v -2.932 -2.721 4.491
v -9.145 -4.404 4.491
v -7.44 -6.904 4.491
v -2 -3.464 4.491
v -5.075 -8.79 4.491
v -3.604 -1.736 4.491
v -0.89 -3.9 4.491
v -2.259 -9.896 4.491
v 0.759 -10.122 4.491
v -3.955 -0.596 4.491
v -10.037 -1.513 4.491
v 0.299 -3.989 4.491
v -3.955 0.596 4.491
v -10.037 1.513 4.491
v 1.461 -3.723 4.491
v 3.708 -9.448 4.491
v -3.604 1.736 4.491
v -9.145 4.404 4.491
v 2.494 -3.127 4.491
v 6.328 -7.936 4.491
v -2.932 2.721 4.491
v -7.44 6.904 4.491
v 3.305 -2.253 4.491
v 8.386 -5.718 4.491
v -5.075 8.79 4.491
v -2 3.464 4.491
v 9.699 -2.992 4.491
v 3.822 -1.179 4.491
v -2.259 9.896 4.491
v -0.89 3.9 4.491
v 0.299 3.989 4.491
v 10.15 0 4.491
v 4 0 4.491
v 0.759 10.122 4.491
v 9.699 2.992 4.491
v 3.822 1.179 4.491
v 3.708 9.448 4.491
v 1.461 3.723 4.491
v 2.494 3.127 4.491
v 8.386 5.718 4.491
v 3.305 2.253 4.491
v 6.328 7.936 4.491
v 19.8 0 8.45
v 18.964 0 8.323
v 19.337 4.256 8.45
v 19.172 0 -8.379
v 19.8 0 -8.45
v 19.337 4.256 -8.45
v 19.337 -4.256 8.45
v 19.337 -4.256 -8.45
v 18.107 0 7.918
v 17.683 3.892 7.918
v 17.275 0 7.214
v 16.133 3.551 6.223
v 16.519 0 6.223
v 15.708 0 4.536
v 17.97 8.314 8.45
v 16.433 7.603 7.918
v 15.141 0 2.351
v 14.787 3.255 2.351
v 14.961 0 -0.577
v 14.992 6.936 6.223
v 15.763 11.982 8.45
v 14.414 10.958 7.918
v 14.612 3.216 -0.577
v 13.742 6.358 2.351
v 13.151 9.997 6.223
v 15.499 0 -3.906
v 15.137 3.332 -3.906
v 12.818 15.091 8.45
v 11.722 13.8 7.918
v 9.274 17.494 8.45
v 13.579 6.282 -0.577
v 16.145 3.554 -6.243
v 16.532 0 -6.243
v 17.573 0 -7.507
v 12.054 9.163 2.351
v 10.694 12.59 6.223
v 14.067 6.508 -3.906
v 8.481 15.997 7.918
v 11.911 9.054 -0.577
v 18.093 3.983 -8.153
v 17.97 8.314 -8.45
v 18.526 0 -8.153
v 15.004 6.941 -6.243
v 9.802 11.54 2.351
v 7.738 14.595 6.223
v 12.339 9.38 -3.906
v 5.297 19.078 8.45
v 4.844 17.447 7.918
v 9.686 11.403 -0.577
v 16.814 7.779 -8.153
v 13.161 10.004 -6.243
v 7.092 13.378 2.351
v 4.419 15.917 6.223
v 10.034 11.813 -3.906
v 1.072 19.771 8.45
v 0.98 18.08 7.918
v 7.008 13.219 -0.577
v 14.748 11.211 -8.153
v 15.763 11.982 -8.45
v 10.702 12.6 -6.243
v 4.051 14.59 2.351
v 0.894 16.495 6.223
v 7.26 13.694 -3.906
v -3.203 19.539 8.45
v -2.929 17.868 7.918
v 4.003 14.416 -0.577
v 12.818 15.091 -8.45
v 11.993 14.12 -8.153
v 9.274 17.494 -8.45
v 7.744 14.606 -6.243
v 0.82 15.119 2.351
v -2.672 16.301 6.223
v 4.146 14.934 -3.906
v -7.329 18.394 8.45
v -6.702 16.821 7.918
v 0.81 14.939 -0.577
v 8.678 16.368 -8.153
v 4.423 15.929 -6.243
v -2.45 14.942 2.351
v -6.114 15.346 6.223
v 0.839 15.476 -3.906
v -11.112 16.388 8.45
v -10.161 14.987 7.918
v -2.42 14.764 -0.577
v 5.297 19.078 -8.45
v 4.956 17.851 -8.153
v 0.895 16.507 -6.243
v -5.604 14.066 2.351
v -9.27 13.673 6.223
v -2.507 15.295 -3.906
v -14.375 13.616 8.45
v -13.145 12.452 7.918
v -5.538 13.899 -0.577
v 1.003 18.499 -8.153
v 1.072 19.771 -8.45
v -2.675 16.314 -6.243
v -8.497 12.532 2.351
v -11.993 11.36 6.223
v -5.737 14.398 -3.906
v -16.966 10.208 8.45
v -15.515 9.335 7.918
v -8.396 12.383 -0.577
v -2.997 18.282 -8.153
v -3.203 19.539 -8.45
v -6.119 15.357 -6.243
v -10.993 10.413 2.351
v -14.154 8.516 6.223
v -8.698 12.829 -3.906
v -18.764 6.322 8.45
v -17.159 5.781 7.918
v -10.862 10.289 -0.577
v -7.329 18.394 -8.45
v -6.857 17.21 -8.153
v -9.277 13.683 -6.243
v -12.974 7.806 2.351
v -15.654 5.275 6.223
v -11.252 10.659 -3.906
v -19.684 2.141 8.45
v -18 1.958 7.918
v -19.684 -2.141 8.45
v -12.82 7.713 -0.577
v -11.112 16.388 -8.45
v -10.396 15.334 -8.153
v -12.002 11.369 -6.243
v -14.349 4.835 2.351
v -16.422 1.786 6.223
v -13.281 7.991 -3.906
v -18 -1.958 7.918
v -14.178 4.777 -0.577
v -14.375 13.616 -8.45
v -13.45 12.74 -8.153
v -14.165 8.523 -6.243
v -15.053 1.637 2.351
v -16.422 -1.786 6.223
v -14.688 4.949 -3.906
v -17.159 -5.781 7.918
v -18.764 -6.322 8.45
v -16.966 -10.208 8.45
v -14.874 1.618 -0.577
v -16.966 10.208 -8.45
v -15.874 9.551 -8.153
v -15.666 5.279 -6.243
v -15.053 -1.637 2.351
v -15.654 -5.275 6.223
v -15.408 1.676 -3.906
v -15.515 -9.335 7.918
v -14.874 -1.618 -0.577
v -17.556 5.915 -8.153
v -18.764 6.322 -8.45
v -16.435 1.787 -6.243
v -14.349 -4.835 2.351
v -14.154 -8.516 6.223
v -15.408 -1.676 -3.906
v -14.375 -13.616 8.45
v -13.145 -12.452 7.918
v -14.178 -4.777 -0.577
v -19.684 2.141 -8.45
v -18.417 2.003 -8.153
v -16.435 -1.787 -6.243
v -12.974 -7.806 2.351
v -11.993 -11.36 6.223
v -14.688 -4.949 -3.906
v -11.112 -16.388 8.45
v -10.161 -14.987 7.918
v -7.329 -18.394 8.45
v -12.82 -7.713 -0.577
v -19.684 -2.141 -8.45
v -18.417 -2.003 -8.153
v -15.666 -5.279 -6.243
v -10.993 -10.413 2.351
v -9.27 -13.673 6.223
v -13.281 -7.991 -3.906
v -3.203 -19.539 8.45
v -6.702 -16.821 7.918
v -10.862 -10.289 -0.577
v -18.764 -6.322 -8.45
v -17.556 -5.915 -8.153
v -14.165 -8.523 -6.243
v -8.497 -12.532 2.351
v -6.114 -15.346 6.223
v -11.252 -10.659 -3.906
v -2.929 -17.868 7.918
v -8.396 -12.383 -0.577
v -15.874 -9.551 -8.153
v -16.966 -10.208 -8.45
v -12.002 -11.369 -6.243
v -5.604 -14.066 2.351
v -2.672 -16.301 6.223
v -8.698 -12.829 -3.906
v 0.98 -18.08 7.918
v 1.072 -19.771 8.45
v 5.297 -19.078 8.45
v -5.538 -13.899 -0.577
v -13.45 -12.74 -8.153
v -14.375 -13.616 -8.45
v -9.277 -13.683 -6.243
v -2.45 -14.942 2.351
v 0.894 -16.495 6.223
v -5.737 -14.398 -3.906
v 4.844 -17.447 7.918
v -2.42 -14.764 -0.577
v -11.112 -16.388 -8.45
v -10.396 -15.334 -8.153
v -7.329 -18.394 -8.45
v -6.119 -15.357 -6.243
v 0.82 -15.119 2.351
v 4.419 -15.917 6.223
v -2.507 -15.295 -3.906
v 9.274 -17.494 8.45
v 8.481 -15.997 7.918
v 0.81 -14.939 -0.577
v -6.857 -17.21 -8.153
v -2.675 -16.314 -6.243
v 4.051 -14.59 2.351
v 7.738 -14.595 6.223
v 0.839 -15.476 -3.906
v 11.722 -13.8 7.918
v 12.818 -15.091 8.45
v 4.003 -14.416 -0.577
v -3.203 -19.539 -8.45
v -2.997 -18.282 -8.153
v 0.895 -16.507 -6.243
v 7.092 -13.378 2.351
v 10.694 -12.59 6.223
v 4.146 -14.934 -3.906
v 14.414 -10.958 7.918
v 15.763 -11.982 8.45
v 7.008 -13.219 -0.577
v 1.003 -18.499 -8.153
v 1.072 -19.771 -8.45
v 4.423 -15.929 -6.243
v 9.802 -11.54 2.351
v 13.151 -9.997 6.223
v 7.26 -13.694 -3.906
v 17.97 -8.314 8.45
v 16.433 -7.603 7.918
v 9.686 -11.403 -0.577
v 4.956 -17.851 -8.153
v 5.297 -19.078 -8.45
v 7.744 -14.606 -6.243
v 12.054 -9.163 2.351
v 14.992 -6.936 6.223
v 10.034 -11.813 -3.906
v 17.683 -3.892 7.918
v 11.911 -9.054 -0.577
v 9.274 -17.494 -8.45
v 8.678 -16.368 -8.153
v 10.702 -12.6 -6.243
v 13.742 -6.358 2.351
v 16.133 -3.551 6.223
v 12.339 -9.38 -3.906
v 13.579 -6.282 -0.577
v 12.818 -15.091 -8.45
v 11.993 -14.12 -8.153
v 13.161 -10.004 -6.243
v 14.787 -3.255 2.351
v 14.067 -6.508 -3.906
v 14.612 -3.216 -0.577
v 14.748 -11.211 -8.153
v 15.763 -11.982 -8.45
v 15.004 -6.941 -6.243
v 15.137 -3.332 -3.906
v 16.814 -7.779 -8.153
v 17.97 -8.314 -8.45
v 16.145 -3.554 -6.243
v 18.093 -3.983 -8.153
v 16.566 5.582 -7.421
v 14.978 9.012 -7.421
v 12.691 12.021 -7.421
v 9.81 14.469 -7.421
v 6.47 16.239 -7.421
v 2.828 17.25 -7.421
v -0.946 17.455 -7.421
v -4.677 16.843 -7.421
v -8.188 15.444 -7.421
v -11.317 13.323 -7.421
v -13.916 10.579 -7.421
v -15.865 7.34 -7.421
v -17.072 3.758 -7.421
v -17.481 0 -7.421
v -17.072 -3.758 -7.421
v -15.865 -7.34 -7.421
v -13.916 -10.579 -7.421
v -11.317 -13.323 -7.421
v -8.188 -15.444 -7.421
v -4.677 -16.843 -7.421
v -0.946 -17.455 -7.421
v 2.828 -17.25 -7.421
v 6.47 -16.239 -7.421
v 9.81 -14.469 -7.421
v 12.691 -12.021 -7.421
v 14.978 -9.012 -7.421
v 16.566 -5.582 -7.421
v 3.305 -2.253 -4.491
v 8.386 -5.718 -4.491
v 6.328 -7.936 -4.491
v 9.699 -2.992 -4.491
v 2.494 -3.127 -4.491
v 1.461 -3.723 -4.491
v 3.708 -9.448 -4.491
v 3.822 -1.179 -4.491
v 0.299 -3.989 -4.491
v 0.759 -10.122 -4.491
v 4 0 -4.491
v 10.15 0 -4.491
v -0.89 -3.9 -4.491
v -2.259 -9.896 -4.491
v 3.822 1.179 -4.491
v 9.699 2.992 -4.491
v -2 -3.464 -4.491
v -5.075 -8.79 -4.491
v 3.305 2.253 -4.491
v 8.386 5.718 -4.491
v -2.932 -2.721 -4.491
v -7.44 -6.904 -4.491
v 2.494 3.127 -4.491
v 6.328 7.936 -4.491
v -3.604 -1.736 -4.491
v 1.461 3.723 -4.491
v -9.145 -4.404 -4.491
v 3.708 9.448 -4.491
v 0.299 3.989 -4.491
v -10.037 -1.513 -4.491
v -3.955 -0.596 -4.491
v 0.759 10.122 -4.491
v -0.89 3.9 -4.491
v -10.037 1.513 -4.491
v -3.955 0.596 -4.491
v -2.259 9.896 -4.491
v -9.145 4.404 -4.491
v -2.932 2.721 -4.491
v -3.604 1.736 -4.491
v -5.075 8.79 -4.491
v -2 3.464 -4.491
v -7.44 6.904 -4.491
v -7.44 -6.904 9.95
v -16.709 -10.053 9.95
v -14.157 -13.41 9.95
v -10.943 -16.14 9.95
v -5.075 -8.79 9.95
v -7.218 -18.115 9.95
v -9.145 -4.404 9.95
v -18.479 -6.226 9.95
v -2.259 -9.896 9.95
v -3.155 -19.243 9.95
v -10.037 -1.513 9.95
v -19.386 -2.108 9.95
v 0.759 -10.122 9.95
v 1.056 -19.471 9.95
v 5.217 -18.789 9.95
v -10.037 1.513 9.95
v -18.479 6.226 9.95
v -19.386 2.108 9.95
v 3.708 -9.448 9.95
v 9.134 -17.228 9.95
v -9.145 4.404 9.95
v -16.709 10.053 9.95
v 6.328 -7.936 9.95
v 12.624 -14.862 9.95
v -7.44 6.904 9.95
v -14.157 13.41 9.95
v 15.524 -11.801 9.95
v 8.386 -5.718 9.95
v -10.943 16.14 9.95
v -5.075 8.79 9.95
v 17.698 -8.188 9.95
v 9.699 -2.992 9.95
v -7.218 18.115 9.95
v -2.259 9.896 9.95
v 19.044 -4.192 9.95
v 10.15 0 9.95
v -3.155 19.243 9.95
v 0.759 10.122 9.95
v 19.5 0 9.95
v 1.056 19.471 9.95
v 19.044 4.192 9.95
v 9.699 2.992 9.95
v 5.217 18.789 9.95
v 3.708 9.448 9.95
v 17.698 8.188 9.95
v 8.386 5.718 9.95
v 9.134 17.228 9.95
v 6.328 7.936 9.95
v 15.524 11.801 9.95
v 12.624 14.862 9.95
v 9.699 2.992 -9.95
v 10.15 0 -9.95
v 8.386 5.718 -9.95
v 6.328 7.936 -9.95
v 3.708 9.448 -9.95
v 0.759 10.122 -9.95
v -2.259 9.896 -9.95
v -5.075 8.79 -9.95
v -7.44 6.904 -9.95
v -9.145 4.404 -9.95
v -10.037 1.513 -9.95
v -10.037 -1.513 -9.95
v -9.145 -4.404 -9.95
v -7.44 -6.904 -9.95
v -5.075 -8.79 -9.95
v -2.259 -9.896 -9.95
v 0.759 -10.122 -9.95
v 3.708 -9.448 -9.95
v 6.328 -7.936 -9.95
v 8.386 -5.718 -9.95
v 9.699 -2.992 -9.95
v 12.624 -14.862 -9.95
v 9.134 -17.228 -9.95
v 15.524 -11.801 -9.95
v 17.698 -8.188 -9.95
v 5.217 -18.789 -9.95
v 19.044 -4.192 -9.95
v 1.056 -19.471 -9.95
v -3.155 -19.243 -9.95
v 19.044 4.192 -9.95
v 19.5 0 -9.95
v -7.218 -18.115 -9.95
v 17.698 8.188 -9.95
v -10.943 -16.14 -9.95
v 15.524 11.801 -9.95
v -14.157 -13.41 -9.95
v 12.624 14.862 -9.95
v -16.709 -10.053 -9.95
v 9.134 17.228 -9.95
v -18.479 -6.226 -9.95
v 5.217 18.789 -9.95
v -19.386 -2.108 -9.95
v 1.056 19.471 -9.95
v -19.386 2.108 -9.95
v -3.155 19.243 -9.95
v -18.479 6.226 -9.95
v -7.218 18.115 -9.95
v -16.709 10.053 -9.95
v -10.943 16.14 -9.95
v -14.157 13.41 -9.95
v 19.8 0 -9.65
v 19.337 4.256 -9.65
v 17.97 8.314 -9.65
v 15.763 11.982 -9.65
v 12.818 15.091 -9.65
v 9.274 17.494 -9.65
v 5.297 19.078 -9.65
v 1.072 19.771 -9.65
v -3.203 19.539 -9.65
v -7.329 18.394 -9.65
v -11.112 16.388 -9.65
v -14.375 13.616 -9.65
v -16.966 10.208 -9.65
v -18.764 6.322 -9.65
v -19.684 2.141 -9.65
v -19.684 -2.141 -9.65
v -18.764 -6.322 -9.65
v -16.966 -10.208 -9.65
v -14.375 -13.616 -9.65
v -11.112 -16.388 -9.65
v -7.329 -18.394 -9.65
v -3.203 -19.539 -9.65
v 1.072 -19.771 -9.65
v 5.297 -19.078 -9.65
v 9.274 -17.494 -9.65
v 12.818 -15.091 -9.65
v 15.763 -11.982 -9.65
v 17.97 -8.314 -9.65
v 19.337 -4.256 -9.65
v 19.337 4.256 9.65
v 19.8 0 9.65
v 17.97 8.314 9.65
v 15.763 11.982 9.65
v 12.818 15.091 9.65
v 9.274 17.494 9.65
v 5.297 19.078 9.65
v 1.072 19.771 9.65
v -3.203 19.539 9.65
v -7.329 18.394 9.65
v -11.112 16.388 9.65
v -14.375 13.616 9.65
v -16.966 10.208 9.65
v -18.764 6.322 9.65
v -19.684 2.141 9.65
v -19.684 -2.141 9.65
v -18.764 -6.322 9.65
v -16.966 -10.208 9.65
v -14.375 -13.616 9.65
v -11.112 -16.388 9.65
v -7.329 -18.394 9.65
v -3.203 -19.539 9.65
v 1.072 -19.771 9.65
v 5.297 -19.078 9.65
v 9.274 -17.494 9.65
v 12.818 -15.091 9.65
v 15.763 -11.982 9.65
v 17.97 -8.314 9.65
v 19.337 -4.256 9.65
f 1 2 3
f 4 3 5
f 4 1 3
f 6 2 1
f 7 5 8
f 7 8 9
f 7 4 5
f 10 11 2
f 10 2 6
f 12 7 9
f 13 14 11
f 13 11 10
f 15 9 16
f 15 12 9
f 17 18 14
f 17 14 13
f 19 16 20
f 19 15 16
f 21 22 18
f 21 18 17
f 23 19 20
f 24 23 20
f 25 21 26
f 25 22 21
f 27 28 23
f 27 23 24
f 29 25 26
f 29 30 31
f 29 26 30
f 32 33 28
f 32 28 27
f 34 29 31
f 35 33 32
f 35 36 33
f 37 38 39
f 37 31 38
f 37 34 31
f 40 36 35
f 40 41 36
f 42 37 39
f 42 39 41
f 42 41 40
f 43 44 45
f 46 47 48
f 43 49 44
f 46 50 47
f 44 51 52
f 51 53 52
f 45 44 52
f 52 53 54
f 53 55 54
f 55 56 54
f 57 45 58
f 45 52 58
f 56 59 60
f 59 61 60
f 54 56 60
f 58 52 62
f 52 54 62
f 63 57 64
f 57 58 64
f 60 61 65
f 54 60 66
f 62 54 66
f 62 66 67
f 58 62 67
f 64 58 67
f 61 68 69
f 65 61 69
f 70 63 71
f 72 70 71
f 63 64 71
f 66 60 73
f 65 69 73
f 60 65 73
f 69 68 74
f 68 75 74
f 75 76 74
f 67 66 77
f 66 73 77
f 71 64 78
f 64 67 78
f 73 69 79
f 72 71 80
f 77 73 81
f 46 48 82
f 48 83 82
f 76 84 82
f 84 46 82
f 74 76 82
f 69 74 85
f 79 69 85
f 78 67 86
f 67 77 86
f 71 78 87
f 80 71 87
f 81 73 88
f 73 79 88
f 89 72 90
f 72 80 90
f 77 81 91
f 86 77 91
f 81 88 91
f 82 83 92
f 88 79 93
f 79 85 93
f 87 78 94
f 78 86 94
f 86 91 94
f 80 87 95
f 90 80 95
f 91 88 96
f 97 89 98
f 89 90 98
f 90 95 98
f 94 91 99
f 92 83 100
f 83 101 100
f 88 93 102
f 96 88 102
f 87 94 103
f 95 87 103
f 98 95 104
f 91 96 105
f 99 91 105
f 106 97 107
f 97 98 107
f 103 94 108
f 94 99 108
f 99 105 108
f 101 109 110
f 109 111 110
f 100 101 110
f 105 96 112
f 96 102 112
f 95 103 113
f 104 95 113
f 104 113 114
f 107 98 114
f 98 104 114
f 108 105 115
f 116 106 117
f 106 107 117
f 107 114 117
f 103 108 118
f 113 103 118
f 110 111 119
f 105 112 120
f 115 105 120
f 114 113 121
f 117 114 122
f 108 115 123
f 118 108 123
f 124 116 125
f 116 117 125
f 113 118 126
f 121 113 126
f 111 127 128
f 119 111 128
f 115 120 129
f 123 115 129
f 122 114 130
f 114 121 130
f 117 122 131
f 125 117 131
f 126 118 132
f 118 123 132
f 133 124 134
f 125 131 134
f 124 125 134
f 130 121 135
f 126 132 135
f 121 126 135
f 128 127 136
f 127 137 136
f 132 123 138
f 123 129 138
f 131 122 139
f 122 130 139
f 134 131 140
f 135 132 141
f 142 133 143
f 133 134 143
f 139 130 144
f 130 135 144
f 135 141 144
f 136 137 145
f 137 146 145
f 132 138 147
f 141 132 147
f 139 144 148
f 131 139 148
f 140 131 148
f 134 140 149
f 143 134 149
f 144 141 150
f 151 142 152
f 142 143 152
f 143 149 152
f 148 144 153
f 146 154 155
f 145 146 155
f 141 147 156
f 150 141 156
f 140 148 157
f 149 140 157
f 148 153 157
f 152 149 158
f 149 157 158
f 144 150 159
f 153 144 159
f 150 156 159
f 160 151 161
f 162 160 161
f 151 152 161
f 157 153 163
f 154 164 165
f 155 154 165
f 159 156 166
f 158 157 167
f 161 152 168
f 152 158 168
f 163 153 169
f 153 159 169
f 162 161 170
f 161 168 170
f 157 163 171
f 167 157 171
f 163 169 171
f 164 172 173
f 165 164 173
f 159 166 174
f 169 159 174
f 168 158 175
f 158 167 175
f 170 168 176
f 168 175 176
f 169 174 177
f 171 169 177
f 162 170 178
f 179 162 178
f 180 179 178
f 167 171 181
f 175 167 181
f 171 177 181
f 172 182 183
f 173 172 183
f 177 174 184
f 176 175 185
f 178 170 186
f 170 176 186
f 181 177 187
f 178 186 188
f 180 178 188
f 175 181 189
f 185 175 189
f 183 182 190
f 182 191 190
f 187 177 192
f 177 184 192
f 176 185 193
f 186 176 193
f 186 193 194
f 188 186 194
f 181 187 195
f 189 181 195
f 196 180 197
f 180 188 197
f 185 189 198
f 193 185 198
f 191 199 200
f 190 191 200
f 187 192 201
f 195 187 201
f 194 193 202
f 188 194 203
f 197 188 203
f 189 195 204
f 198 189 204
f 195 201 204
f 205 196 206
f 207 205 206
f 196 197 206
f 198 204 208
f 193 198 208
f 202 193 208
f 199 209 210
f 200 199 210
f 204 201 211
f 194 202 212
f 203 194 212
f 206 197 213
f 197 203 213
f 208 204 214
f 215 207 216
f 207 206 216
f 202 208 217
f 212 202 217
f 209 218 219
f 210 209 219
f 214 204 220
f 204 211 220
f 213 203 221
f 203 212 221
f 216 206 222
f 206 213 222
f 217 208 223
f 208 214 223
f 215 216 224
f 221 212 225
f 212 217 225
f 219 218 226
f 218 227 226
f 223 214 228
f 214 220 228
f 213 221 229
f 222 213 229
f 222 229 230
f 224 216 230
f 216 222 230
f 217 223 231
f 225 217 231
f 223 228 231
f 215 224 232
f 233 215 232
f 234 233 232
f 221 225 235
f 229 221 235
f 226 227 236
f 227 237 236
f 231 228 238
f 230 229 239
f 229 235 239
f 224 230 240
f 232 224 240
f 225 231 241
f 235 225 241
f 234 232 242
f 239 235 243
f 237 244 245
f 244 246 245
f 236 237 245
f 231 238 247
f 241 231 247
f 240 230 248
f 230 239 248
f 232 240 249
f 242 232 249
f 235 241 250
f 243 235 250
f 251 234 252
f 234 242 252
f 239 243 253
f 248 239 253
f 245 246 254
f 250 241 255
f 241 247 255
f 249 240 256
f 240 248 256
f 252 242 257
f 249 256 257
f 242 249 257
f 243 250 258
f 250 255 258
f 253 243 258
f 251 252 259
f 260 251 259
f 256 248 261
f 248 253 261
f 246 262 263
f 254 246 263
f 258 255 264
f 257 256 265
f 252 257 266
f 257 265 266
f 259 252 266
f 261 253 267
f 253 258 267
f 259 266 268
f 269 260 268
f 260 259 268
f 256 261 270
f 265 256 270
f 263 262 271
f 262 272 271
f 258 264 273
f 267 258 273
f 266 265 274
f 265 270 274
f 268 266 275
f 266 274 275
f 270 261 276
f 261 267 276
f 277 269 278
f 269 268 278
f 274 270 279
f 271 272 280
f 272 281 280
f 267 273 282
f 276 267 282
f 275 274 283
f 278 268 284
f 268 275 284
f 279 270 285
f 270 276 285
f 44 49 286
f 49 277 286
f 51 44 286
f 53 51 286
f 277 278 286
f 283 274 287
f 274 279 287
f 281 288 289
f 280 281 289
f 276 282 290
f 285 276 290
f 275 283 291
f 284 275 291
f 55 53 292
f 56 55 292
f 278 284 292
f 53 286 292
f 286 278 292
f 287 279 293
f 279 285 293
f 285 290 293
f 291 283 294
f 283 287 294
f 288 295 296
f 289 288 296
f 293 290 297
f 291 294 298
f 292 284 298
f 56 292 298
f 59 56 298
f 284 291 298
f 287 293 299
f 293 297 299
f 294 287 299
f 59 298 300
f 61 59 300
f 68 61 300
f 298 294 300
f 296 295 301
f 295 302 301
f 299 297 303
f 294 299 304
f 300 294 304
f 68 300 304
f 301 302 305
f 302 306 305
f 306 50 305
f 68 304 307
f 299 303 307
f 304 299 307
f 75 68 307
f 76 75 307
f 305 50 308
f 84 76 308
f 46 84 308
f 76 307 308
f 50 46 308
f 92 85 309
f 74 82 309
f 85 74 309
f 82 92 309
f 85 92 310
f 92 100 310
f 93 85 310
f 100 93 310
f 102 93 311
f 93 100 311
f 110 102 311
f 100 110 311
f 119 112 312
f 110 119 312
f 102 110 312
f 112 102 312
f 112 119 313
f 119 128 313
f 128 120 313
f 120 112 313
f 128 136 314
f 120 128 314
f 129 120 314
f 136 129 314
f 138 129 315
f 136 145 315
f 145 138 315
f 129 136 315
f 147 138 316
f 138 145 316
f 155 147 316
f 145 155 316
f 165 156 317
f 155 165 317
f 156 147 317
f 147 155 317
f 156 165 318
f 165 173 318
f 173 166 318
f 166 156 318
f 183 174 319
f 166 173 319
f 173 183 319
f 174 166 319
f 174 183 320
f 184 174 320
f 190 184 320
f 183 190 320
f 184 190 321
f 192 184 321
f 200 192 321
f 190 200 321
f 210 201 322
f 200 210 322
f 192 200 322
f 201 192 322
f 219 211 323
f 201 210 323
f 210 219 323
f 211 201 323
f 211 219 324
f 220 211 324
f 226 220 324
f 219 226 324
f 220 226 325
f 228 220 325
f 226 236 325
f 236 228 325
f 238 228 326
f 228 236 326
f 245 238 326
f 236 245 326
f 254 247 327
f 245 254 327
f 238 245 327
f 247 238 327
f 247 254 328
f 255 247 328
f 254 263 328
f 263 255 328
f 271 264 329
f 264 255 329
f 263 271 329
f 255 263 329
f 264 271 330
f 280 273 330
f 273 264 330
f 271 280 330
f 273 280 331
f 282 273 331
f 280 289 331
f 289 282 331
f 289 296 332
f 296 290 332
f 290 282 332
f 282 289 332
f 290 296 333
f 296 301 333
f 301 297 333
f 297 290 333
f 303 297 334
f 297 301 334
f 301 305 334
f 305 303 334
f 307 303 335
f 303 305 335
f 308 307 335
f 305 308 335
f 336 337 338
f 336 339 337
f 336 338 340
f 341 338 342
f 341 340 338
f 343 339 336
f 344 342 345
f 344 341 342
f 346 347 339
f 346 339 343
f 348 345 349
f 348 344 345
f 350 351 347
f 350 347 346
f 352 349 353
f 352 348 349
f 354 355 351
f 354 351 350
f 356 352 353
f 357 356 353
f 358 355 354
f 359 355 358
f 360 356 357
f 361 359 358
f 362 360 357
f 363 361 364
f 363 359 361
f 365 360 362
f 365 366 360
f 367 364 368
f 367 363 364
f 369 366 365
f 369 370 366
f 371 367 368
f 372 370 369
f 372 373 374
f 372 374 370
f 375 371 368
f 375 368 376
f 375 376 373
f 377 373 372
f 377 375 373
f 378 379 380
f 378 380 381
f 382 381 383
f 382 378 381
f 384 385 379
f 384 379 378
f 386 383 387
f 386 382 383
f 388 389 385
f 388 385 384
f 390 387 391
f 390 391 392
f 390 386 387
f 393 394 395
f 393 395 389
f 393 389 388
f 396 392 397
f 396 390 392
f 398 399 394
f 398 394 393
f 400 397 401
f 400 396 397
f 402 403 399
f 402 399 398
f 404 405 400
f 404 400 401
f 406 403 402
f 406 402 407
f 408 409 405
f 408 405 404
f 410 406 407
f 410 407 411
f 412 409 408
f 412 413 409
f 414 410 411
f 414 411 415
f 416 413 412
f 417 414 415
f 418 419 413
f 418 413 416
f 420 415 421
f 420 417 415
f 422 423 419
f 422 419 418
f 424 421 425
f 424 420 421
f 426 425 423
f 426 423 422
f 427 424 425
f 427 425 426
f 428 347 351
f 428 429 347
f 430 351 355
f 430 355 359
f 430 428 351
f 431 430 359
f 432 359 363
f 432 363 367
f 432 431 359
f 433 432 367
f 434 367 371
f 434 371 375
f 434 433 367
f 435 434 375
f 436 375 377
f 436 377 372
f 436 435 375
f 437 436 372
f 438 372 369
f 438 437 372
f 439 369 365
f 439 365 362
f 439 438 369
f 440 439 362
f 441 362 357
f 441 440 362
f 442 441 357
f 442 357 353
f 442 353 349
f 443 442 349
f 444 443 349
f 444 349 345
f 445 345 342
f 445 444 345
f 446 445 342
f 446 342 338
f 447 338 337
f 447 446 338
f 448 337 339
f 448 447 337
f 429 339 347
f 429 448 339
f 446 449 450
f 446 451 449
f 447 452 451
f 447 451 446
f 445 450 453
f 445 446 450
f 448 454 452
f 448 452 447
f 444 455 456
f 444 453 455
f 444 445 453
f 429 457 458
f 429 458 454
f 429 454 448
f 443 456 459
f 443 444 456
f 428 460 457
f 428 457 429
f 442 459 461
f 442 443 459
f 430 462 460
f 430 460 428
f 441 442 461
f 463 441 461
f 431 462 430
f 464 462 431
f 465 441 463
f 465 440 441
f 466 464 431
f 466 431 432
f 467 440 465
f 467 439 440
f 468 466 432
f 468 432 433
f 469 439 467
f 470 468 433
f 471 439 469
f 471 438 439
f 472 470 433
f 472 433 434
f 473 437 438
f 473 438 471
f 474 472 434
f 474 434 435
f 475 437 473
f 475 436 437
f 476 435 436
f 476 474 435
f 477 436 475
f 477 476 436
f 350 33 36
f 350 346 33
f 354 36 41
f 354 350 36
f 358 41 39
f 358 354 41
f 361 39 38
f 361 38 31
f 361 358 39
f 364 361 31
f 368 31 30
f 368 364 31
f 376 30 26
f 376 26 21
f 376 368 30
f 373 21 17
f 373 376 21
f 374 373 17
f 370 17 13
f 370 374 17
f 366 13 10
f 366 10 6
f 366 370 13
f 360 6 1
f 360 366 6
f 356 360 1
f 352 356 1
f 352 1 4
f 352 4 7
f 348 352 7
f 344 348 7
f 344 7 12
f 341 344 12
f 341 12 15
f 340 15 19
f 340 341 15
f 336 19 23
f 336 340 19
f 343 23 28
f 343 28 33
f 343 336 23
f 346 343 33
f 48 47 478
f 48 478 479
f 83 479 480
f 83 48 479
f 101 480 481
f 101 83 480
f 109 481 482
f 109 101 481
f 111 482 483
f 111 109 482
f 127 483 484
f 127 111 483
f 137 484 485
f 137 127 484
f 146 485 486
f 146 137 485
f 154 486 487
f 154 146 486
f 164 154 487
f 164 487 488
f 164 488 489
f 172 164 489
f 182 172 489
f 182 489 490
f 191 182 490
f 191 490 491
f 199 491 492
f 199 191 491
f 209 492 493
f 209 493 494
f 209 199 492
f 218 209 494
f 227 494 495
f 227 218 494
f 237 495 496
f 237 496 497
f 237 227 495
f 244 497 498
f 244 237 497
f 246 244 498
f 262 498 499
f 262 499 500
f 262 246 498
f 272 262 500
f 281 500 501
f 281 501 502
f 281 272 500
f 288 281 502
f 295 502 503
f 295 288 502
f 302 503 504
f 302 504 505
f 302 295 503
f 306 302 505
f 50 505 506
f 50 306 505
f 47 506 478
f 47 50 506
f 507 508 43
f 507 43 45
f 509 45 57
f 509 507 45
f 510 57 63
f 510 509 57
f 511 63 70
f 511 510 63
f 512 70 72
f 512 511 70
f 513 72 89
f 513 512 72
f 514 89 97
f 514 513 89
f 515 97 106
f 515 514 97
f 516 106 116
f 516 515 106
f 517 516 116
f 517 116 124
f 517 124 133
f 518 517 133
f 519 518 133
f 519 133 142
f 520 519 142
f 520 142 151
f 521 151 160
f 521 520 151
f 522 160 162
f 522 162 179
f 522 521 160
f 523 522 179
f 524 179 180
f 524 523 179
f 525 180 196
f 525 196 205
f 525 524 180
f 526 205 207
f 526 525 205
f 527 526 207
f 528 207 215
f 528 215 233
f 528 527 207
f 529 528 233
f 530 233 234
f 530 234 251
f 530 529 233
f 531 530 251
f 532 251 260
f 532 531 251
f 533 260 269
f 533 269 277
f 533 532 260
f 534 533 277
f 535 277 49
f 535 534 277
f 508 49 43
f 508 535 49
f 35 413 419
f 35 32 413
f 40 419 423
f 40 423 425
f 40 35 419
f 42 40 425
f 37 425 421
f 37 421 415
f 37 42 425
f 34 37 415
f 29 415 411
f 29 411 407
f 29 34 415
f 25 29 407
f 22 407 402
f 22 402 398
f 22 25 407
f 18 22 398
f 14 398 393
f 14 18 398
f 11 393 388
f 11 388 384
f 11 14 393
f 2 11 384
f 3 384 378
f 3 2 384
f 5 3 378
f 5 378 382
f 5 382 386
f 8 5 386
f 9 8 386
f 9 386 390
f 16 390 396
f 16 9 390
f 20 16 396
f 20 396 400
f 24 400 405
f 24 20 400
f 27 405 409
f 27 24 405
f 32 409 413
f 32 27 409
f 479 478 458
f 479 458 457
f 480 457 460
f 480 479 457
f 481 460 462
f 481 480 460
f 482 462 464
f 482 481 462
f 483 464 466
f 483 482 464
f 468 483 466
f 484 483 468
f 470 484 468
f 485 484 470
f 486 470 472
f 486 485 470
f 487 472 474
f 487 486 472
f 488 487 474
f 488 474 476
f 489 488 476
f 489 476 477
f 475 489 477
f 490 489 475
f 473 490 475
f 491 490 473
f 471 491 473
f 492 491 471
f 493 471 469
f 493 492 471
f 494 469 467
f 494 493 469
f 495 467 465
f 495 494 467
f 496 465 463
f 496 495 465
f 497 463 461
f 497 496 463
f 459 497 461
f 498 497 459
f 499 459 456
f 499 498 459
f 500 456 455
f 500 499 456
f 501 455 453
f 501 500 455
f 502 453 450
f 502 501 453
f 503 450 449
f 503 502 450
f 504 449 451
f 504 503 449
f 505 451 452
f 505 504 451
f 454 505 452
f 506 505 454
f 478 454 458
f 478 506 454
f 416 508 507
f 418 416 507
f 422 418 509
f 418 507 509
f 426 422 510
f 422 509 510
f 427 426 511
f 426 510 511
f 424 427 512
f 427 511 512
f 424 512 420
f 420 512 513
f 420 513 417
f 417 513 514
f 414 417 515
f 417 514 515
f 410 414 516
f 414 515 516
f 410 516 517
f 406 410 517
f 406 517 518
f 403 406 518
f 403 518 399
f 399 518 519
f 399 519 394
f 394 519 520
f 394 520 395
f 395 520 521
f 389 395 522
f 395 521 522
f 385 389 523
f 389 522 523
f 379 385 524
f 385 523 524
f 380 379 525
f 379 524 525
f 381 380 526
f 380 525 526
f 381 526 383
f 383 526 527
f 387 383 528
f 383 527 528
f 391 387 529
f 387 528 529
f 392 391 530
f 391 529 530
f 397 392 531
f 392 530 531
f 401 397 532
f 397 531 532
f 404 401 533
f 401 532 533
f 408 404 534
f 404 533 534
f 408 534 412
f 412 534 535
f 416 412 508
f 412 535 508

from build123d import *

# Parameters (mm, degrees)
F2_SIZE = 0.3


with BuildPart() as f1:
    # F0 (on Front) → F1 (revolve)
    with BuildSketch(Plane.XZ):
        with BuildLine():
            Line((19.8, 9.95), (10.15, 9.95))
            Line((10.15, 9.95), (10.15, 4.4908430427))
            Line((10.15, 4.4908430427), (4, 4.4908430427))
            Line((4, 4.4908430427), (4, -4.4908430427))
            Line((4, -4.4908430427), (10.15, -4.4908430427))
            Line((10.15, -4.4908430427), (10.15, -9.95))
            Line((10.15, -9.95), (19.8, -9.95))
            Line((19.8, -9.95), (19.8, -8.45))
            add(Edge.make_bspline(
                [(14.95, 0), (14.95, -8.45), (19.8, -8.45)],
                knots=[4.7123889804, 4.7123889804, 4.7123889804, 6.2831853072, 6.2831853072, 6.2831853072], degree=2, weights=[1, 0.7071067812, 1]))
            add(Edge.make_bspline(
                [(19.8, 8.45), (14.95, 8.45), (14.95, 0)],
                knots=[0, 0, 0, 1.5707963268, 1.5707963268, 1.5707963268], degree=2, weights=[1, 0.7071067812, 1]))
            Line((19.8, 8.45), (19.8, 9.95))
        make_face()
    revolve(axis=Axis((0, 0, 2.2454215214), (0, 0, 1)))

    # F2
    f2_edges = [f1.edges().sort_by_distance(p)[0] for p in [
        (-19.8, 0, 9.95),
        (-19.8, 0, -9.95),
    ]]
    chamfer(f2_edges, length=F2_SIZE)


solid = f1.part
